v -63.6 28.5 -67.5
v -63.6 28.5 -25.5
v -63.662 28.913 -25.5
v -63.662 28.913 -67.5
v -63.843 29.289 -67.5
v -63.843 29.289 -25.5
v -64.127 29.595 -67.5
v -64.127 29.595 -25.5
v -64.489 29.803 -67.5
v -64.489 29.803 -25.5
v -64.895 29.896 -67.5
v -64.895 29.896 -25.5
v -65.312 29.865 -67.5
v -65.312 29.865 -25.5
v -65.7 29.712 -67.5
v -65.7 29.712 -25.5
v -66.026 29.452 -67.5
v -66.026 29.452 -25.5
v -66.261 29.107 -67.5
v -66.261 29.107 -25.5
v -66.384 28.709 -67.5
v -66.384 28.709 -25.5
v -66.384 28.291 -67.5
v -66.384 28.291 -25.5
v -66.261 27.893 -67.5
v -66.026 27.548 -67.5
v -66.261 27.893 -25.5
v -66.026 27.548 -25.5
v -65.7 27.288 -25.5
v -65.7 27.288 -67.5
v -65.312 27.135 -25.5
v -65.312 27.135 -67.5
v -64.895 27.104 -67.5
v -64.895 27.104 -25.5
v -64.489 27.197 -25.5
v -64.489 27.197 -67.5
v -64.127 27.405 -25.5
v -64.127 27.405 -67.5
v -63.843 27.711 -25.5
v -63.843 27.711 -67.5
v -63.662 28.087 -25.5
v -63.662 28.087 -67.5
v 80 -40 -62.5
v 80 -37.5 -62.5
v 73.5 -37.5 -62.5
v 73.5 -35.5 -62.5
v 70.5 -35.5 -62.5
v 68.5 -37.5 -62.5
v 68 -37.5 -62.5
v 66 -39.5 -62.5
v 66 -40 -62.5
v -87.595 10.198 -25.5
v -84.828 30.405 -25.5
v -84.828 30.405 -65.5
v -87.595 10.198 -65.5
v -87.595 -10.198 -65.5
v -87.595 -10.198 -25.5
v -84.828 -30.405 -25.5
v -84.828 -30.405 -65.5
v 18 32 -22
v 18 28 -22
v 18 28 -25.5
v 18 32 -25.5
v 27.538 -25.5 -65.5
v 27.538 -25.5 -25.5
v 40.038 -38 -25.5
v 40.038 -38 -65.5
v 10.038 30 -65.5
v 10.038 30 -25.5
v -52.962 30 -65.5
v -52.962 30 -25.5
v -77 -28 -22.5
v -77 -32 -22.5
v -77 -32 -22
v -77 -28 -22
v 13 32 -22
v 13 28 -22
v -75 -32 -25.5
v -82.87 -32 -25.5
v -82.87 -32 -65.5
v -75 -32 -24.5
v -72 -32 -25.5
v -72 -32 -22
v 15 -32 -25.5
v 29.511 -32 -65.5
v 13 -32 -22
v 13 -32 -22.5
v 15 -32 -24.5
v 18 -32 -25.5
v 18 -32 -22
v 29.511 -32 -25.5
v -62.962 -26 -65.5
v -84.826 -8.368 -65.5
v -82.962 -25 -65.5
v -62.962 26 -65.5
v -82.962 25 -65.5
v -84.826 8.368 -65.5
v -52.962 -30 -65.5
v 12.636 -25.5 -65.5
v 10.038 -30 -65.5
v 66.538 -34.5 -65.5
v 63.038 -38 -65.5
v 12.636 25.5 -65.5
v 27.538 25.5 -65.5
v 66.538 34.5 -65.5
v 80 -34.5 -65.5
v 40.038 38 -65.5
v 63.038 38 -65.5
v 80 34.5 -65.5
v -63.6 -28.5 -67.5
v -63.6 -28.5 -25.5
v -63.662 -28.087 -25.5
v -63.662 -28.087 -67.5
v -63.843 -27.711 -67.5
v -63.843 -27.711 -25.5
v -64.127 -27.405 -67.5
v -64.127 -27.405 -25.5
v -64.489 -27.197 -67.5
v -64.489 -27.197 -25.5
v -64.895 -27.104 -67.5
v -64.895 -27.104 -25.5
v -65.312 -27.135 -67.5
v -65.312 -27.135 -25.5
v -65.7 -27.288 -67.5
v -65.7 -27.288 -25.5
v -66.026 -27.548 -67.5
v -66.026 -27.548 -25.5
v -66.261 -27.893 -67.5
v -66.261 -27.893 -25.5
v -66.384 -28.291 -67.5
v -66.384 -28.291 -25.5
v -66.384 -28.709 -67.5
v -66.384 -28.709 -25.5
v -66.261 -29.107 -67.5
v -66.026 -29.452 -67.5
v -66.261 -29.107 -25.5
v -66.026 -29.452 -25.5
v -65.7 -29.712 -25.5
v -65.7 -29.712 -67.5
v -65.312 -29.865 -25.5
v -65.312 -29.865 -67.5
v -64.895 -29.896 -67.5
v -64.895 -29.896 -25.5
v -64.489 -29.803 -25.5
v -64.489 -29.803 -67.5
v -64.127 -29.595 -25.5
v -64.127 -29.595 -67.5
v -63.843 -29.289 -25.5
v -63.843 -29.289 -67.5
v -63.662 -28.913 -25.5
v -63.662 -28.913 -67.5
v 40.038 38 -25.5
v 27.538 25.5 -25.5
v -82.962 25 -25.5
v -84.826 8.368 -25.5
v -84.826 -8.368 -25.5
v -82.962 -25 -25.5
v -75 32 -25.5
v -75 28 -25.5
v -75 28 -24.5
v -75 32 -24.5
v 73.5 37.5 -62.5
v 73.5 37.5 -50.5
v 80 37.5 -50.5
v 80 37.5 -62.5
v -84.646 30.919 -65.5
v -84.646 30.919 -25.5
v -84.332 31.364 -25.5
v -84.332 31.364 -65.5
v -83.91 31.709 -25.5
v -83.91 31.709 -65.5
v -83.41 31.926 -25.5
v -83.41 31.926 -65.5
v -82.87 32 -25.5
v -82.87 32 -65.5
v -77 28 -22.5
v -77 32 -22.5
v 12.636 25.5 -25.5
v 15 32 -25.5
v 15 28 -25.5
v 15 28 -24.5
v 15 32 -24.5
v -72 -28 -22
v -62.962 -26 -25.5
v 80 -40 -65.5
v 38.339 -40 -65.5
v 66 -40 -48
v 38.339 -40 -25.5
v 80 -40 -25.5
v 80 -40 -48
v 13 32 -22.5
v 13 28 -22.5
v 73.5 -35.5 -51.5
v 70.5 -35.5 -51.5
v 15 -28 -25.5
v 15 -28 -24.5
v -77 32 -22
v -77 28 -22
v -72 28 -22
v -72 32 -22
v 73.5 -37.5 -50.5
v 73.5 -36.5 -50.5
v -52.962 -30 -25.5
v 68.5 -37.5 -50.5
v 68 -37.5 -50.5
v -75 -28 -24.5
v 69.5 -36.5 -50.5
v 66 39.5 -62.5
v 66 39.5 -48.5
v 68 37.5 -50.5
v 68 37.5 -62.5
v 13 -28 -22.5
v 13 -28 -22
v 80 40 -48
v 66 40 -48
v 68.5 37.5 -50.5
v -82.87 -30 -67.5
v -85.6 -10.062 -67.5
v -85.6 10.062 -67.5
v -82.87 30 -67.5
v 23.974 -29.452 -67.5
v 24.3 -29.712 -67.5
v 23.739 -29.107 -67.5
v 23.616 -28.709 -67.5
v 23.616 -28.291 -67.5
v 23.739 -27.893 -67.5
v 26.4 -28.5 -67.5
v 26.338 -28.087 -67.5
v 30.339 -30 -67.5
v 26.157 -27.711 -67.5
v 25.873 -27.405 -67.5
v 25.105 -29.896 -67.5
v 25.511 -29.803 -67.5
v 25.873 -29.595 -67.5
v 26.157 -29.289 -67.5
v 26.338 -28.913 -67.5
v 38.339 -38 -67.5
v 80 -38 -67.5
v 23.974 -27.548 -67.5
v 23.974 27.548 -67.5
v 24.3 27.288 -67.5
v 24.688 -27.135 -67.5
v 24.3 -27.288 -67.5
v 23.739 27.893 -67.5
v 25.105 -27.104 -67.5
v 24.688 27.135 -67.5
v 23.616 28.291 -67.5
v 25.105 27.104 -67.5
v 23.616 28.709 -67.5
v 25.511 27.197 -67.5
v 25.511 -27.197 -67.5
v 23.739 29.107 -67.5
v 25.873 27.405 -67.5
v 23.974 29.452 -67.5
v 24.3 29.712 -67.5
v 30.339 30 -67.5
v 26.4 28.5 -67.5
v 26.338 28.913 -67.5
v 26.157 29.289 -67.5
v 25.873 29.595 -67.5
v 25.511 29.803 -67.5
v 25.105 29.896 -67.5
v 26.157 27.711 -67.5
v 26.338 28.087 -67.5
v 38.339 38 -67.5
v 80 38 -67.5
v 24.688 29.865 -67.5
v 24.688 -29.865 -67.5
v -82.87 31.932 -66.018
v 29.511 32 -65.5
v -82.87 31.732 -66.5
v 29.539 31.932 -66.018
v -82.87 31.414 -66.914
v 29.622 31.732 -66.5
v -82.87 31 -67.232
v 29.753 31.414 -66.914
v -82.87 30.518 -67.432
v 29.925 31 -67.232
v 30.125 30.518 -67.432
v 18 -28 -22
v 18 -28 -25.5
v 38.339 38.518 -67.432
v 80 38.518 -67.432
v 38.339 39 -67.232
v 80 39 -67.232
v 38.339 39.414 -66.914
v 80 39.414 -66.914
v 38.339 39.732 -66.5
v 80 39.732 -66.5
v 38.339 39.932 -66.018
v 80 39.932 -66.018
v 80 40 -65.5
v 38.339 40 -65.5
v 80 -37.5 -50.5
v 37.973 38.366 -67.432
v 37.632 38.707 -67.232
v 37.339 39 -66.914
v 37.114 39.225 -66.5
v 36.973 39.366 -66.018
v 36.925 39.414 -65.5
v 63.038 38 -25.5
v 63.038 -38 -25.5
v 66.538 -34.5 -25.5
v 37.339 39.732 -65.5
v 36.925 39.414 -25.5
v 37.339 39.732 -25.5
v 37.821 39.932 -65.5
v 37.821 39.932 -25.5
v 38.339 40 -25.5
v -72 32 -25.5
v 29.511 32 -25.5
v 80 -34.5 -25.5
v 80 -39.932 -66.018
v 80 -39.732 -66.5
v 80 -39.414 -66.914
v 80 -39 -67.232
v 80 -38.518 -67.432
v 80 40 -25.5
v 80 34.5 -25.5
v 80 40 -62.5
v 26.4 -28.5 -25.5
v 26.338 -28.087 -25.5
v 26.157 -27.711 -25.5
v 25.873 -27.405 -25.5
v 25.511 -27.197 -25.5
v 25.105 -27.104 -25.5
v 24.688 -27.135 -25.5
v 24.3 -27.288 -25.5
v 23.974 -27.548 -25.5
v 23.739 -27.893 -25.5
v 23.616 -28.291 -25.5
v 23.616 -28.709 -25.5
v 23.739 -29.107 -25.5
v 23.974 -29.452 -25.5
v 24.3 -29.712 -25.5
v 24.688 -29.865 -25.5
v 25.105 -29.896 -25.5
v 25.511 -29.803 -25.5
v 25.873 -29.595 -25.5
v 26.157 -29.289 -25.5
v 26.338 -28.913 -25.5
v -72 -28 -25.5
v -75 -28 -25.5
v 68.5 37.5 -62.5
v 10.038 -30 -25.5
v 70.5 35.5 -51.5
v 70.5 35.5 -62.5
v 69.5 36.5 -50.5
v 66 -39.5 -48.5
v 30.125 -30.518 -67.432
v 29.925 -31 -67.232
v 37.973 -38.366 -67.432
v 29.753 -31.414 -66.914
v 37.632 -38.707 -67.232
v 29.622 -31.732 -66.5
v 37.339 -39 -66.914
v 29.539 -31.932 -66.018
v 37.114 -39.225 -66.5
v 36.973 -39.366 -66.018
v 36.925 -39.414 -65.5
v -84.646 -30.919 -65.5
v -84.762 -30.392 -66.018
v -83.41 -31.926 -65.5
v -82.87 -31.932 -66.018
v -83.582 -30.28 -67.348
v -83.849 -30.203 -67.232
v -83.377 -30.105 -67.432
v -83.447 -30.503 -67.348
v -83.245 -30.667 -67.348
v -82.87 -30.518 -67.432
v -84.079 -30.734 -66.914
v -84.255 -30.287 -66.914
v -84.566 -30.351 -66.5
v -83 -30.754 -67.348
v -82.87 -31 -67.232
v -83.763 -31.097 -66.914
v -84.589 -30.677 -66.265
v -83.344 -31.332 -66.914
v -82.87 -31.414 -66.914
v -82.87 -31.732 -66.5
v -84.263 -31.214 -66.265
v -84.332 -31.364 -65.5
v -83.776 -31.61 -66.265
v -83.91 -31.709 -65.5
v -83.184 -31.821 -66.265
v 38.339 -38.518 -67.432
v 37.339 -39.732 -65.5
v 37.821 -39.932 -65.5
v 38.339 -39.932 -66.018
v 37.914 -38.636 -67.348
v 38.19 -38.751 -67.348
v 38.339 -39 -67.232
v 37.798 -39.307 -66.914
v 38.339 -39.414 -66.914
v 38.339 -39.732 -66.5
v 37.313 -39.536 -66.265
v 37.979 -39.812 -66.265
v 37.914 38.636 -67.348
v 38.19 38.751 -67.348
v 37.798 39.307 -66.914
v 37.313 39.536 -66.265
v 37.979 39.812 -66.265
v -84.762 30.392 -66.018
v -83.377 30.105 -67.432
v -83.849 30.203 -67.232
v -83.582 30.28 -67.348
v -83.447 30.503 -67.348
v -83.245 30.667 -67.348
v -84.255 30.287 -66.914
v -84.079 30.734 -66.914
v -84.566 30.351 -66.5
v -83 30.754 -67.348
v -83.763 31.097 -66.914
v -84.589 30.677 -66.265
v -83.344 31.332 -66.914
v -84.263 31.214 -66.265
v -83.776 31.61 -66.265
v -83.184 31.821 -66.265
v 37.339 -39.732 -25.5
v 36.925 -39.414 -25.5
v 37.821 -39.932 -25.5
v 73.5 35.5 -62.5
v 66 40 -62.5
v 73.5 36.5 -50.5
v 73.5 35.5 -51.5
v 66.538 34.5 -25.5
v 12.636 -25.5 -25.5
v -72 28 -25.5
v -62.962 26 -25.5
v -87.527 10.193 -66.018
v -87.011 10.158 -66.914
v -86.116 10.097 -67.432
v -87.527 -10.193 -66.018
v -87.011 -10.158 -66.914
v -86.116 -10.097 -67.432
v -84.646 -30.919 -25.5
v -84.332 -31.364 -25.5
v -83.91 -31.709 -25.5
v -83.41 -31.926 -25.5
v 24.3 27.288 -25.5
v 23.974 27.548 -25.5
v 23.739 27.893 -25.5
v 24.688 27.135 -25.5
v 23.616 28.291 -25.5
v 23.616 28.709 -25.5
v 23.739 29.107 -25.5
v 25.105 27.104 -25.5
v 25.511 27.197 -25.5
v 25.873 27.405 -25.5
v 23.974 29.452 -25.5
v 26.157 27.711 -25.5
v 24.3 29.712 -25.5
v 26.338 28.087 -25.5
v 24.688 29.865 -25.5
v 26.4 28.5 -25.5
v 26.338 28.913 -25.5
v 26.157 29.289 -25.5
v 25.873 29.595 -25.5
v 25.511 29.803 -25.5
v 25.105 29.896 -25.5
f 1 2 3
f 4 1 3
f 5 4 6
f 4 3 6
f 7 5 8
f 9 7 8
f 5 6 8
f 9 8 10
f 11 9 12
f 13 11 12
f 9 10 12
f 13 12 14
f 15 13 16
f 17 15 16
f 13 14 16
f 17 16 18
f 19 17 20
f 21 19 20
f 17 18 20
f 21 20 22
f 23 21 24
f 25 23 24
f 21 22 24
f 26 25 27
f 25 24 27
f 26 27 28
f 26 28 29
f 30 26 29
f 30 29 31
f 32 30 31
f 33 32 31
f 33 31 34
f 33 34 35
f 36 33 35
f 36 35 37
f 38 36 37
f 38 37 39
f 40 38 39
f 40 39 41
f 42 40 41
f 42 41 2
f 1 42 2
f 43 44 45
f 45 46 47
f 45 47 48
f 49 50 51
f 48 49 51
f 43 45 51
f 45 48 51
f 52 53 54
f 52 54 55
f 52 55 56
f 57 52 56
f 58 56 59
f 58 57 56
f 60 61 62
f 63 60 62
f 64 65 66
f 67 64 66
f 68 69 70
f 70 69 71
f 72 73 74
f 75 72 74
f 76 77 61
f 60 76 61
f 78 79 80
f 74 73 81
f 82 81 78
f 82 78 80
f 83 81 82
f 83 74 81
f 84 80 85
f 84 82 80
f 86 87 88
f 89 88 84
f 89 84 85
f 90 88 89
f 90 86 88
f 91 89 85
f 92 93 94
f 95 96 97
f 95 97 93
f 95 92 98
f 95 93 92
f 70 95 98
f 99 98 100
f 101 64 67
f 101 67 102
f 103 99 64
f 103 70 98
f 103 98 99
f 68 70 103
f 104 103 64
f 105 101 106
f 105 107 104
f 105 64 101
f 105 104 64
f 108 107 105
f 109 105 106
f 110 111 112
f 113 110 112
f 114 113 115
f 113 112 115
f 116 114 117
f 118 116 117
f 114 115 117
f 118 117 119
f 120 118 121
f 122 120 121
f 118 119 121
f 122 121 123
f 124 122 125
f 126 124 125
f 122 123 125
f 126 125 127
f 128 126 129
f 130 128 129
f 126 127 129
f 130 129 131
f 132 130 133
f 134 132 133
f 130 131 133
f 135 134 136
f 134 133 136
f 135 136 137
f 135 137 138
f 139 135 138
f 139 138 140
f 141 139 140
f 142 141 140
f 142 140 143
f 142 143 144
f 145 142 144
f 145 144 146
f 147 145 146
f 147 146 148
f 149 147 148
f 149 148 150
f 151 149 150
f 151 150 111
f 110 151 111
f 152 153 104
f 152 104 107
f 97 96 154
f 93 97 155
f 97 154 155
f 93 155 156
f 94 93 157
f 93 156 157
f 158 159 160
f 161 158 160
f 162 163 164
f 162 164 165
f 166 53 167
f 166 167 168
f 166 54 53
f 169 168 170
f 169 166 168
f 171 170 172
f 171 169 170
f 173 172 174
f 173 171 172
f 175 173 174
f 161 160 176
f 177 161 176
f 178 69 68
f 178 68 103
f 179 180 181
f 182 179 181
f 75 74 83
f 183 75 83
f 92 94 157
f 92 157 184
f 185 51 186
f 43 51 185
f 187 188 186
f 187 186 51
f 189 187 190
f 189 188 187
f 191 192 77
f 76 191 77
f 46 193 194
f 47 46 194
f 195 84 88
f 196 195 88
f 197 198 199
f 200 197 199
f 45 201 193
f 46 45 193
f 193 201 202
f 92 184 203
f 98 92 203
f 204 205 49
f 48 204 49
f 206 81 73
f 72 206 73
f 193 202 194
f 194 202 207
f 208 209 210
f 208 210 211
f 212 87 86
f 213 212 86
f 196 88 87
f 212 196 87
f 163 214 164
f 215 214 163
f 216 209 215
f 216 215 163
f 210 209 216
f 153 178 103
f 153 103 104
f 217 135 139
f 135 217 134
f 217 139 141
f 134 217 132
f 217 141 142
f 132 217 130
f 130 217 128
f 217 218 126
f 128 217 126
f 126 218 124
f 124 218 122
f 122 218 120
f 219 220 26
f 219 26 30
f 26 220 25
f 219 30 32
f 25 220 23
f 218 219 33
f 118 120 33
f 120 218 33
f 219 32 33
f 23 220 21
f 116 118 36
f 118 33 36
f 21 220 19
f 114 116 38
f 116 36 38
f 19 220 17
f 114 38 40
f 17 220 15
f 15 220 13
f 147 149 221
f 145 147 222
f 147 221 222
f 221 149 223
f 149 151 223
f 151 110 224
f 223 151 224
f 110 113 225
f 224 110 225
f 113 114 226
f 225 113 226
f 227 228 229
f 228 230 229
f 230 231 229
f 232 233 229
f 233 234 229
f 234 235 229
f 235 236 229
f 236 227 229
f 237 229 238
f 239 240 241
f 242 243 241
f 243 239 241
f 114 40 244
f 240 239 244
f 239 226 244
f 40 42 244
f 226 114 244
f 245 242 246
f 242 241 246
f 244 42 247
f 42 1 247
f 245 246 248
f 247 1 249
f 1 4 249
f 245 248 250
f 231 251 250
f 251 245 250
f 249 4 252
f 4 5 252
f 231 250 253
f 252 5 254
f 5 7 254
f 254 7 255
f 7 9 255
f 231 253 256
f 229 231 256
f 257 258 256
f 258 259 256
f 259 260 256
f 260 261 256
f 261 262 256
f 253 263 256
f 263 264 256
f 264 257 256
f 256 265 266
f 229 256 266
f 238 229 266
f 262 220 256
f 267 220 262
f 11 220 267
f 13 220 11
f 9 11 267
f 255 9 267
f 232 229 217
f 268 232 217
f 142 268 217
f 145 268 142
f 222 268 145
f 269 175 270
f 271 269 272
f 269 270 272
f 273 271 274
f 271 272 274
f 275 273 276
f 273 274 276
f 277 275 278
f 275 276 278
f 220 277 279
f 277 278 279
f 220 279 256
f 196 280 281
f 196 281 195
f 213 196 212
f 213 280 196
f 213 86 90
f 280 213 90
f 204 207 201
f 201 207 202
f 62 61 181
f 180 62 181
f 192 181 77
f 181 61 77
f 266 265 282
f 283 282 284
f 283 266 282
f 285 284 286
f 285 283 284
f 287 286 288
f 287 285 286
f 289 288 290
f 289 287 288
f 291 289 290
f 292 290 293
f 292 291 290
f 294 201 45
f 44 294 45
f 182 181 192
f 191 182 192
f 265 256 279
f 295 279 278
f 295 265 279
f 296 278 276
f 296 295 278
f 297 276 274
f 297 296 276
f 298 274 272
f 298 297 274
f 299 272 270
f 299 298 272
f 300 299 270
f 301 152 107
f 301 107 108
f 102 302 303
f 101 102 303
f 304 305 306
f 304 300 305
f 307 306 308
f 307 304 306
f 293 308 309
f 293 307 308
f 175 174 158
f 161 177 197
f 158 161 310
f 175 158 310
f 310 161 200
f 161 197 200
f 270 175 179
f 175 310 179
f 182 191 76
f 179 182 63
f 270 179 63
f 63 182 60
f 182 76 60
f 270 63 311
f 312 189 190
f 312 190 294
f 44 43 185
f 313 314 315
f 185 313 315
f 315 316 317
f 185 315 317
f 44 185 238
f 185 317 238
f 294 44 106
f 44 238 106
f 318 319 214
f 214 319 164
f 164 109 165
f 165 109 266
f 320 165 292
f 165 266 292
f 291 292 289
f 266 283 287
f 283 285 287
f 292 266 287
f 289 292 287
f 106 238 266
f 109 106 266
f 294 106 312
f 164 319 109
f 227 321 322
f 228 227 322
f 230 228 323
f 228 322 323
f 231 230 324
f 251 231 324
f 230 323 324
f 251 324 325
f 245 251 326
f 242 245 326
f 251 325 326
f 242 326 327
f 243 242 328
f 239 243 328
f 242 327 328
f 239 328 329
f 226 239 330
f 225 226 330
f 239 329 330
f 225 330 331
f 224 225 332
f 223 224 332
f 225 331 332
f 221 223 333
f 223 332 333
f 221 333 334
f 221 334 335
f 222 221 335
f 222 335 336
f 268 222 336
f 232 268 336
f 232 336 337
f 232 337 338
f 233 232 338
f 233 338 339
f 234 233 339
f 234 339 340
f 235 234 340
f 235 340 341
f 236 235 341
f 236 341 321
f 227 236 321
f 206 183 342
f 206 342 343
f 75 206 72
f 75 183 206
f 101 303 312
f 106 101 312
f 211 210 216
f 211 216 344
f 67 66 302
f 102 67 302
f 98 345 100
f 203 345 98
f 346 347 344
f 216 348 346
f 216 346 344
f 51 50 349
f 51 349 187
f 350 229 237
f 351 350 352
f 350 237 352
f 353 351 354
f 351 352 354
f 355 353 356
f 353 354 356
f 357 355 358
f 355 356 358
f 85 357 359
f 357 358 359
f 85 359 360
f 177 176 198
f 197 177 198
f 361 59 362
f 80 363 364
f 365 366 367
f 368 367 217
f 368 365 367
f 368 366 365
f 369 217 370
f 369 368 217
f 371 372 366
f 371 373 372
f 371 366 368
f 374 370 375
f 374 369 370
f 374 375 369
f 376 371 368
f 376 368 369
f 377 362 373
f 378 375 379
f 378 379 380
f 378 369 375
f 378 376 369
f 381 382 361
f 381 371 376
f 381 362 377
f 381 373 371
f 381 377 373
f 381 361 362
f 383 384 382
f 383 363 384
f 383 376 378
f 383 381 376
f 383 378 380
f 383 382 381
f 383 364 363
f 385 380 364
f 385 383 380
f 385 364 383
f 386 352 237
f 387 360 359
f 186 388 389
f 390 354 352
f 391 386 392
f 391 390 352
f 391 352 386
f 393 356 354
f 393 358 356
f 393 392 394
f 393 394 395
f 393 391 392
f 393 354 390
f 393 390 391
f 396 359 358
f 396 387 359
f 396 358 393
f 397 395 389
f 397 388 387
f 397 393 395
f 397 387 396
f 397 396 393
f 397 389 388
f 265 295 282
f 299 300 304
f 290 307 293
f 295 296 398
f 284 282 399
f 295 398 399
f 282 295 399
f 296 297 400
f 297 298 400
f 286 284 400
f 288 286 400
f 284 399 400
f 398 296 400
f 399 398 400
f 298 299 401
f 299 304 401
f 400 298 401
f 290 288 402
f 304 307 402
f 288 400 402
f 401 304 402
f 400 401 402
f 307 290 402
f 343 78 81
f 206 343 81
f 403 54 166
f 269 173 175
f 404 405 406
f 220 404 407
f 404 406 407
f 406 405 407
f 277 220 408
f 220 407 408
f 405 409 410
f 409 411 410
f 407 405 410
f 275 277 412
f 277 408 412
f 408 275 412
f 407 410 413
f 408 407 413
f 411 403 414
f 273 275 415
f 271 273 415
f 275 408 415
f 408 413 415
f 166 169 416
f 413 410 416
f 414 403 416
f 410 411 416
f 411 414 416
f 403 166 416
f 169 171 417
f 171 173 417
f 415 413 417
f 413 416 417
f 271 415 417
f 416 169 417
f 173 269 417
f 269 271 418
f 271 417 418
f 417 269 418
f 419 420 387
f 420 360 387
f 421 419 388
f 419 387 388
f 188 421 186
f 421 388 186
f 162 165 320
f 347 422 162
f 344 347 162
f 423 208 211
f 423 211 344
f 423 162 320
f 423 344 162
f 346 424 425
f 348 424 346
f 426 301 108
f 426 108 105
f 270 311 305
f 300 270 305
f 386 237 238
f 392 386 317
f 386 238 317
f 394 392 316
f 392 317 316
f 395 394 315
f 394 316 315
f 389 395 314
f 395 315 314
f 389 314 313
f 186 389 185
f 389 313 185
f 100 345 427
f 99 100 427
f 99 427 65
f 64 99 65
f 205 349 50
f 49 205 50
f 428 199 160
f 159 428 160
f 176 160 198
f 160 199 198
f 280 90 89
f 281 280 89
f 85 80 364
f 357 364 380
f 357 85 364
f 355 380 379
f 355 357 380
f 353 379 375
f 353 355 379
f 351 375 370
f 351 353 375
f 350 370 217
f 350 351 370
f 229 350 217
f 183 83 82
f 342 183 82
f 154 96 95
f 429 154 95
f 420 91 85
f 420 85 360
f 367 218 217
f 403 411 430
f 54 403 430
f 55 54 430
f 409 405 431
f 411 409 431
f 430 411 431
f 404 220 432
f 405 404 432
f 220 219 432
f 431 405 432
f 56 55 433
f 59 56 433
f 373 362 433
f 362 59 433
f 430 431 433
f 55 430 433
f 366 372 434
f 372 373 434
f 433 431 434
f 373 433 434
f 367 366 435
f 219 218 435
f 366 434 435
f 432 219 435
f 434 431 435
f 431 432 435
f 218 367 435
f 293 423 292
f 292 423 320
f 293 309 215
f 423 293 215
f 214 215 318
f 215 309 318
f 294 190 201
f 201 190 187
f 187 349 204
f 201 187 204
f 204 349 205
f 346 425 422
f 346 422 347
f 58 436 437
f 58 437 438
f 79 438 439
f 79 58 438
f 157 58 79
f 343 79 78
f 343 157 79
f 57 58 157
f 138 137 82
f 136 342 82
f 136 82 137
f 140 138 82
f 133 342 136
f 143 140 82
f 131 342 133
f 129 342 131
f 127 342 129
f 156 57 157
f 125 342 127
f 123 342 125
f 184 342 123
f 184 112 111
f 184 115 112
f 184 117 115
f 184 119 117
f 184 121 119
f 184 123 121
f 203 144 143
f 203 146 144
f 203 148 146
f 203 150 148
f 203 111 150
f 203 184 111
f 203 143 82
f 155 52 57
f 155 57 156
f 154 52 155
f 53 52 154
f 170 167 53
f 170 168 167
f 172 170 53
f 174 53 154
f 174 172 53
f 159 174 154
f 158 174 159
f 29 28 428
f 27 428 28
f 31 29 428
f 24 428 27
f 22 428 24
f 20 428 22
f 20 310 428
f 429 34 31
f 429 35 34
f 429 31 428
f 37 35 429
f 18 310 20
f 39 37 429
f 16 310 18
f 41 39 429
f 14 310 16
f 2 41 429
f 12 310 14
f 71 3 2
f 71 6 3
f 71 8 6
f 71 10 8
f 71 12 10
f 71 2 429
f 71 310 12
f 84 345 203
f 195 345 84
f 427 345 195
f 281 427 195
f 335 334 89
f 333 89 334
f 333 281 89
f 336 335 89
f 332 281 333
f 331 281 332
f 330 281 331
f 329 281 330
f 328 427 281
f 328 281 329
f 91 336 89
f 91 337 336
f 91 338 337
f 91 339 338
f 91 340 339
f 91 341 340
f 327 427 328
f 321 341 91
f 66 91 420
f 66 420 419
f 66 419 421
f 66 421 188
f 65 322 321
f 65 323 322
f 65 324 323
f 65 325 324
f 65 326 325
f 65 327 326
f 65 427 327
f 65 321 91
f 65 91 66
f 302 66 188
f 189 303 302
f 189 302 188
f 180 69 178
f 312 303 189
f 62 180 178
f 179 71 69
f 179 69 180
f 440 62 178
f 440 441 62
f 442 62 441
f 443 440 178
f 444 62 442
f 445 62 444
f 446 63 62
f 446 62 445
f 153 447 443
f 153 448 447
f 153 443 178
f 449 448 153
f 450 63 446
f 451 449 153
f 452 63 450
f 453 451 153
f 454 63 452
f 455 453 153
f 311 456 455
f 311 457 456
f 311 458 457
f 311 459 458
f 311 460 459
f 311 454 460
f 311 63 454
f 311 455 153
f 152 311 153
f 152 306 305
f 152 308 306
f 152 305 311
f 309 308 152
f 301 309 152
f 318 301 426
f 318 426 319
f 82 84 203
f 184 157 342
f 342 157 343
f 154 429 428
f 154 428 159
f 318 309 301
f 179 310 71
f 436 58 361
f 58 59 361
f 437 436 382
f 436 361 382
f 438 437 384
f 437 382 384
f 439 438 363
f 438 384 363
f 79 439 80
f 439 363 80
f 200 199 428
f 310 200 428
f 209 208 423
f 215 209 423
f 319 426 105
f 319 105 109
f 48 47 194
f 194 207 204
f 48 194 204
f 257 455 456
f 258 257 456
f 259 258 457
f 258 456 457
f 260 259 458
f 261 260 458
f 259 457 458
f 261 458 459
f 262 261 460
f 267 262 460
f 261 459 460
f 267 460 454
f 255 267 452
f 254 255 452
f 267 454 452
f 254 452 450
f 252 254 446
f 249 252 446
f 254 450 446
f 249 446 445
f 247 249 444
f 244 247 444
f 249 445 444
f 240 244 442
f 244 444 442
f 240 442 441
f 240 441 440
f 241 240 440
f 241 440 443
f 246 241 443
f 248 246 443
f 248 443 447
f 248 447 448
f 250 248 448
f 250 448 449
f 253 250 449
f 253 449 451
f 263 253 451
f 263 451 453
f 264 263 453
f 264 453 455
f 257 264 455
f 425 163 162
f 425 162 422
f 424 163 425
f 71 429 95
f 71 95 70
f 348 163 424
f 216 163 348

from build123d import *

# Parameters (mm, degrees)
EXTRUDE136072_DEPTH                     = 12
CHAMFER002_SIZE                         = 1
EXTRUDE136071_DEPTH                     = 15
CHAMFER001_SIZE                         = 2
SKETCH295_R                             = 1.4
EXTRUDE136074_DEPTH                     = 50
EXTRUDE136076_DEPTH                     = 4
EXTRUDE136076_ONTO_SKETCH296_ROLL_ANGLE = 90
EXTRUDE136075_DEPTH                     = 4
EXTRUDE136075_ONTO_SKETCH296_ROLL_ANGLE = 90
BOX022_W                                = 25
BOX022_H                                = 80
BOX022_DEPTH                            = 51
EXTRUDE136056_DEPTH                     = 40
EXTRUDE136055_DEPTH                     = 42
FILLET_R                                = 2


with BuildPart() as chamfer002:
    # Sketch293 → Extrude136072 (new body)
    with BuildSketch(Plane.XY):
        Polygon((0, 37.5), (5, 37.5), (5, 35.5), (2, 35.5), align=None)
        Polygon((0, -37.5), (5, -37.5), (5, -35.5), (2, -35.5), align=None)
    extrude(amount=-EXTRUDE136072_DEPTH)


with BuildPart() as chamfer002_1:
    # Extrude136072 placement: moved
    add(chamfer002.part.moved(Location((4, 0, 6))))

    # Chamfer002
    chamfer002_edges = [chamfer002_1.edges().sort_by_distance(p)[0] for p in [
        (7.5, -35.5, 6),
        (7.5, 35.5, 6),
    ]]
    chamfer(chamfer002_edges, length=CHAMFER002_SIZE)


with BuildPart() as fusion034004041070:
    # Sketch292 → Extrude136071 (new body)
    with BuildSketch(Plane.YZ):
        Polygon((-40, 8.5), (-37.5, 6), (-37.5, -6), (-40, -6), align=None)
        Polygon((40, 8.5), (37.5, 6), (37.5, -6), (40, -6), align=None)
    extrude(amount=EXTRUDE136071_DEPTH)

    # Chamfer001
    chamfer001_edges = [fusion034004041070.edges().sort_by_distance(p)[0] for p in [
        (0, 37.5, 0),
        (0, -37.5, 0),
    ]]
    chamfer(chamfer001_edges, length=CHAMFER001_SIZE)


with BuildPart() as fusion034004041070_1:
    # Chamfer001 placement: moved
    add(fusion034004041070.part.moved(Location((1.5, 0, 0))))

    # Fusion034004041070: union Chamfer002
    add(chamfer002_1.part)


with BuildPart() as fusion034004041070_2:
    # Fusion034004041070 placement: moved
    add(fusion034004041070_1.part.moved(Location((64.5, 0, -31))))


with BuildPart() as fusion034004041071:
    # Sketch295 → Extrude136074 (new body)
    with BuildSketch(Plane.XY):
        with Locations((-65, 28.5)):
            Circle(SKETCH295_R)
        with Locations((25, 28.5)):
            Circle(SKETCH295_R)
        with Locations((-65, -28.5)):
            Circle(SKETCH295_R)
        with Locations((25, -28.5)):
            Circle(SKETCH295_R)
    extrude(amount=-EXTRUDE136074_DEPTH)

    # Fusion034004041071: union Fusion034004041070
    add(fusion034004041070_2.part)


with BuildPart() as extrude136076:
    # Sketch296 as drawn → Extrude136076 (new)
    with BuildSketch(Plane.XY):
        Polygon((-77, 3.5), (-72, 3.5), (-72, 0), (-75, 0), (-75, 1), (-77, 3), align=None)
        Polygon((15, 0), (15, 1), (13, 3), (13, 3.5), (18, 3.5), (18, 0), align=None)
    extrude(amount=-EXTRUDE136076_DEPTH)


with BuildPart() as extrude136076_1:
    # Extrude136076 onto Sketch296 roll: moved
    add(extrude136076.part.rotate(Axis((0, 0, 0), (1, 0, 0)), EXTRUDE136076_ONTO_SKETCH296_ROLL_ANGLE))


with BuildPart() as extrude136076_2:
    # Extrude136076 onto Sketch296 placement: moved
    add(extrude136076_1.part.moved(Location((0, -2, 0))))


with BuildPart() as extrude136076_3:
    # Extrude136076 placement: moved
    add(extrude136076_2.part.moved(Location((0, -30, 0))))


with BuildPart() as fusion034004041067:
    # Sketch296 as drawn → Extrude136075 (new)
    with BuildSketch(Plane.XY):
        Polygon((-77, 3.5), (-72, 3.5), (-72, 0), (-75, 0), (-75, 1), (-77, 3), align=None)
        Polygon((15, 0), (15, 1), (13, 3), (13, 3.5), (18, 3.5), (18, 0), align=None)
    extrude(amount=-EXTRUDE136075_DEPTH)


with BuildPart() as fusion034004041067_1:
    # Extrude136075 onto Sketch296 roll: moved
    add(fusion034004041067.part.rotate(Axis((0, 0, 0), (1, 0, 0)), EXTRUDE136075_ONTO_SKETCH296_ROLL_ANGLE))


with BuildPart() as fusion034004041067_2:
    # Extrude136075 onto Sketch296 placement: moved
    add(fusion034004041067_1.part.moved(Location((0, -2, 0))))


with BuildPart() as fusion034004041067_3:
    # Extrude136075 placement: moved
    add(fusion034004041067_2.part.moved(Location((0, 30, 0))))

    # Fusion034004041067: union Extrude136076
    add(extrude136076_3.part)


with BuildPart() as cube019:
    # Box022 → Box022 (new body)
    with BuildSketch(Plane(origin=(80, -40, -44), x_dir=(1, 0, 0), z_dir=(0, 0, 1))):
        with Locations((12.5, 40)):
            Rectangle(BOX022_W, BOX022_H)
    extrude(amount=BOX022_DEPTH)


with BuildPart() as extrude136056:
    # Sketch277 → Extrude136056 (new body)
    with BuildSketch(Plane.XY):
        with BuildLine():
            ThreePointArc((81.0383, -34.5), (85.059706, 0), (81.0383, 34.5))
            Line((66.5383, 34.5), (81.0383, 34.5))
            Line((63.0383, 38), (66.5383, 34.5))
            Line((40.0383, 38), (63.0383, 38))
            Line((27.5383, 25.5), (40.0383, 38))
            Line((12.636376, 25.5), (27.5383, 25.5))
            Line((10.0383, 30), (12.636376, 25.5))
            Line((10.0383, 30), (-52.9617, 30))
            Line((-62.9617, 26), (-52.9617, 30))
            Line((-82.9617, 25), (-62.9617, 26))
            ThreePointArc((-82.9617, 25), (-85.059706, 0), (-82.9617, -25))
            Line((-82.9617, -25), (-62.9617, -26))
            Line((-62.9617, -26), (-52.9617, -30))
            Line((10.0383, -30), (-52.9617, -30))
            Line((10.0383, -30), (12.636376, -25.5))
            Line((12.636376, -25.5), (27.5383, -25.5))
            Line((27.5383, -25.5), (40.0383, -38))
            Line((40.0383, -38), (63.0383, -38))
            Line((63.0383, -38), (66.5383, -34.5))
            Line((66.5383, -34.5), (81.0383, -34.5))
        make_face()
    extrude(amount=-EXTRUDE136056_DEPTH)


with BuildPart() as batteryboxfillet:
    # Sketch276 → Extrude136055 (new body)
    with BuildSketch(Plane.XY):
        with BuildLine():
            ThreePointArc((-84.489299, 32), (-87.942378, 0), (-84.489299, -32))
            Line((-84.489299, -32), (29.510701, -32))
            Line((29.510701, -32), (37.510701, -40))
            Line((37.510701, -40), (82.510701, -40))
            ThreePointArc((82.510701, -40), (87.942378, 0), (82.510701, 40))
            Line((37.510701, 40), (82.510701, 40))
            Line((29.510701, 32), (37.510701, 40))
            Line((-84.489299, 32), (29.510701, 32))
        make_face()
    extrude(amount=-EXTRUDE136055_DEPTH)

    # Cut009010006006006005016: cut Extrude136056
    add(extrude136056.part, mode=Mode.SUBTRACT)

    # Cut009010006006006005021: cut Cube019
    add(cube019.part, mode=Mode.SUBTRACT)

    # Fusion034004041068: union Fusion034004041067
    add(fusion034004041067_3.part)

    # Cut009010006006006005024: cut Fusion034004041071
    add(fusion034004041071.part, mode=Mode.SUBTRACT)

    # Fillet
    fillet_edges = [batteryboxfillet.edges().sort_by_distance(p)[0] for p in [
        (-84.489299, 32, -21),
        (-84.489299, -32, -21),
        (-87.942378, 0, -42),
        (-27.489299, 32, -42),
        (-27.489299, -32, -42),
        (33.510701, 36, -42),
        (58.755351, 40, -42),
        (33.510701, -36, -42),
        (58.755351, -40, -42),
        (37.510701, 40, -21),
        (37.510701, -40, -21),
    ]]
    fillet(fillet_edges, radius=FILLET_R)


with BuildPart() as batteryboxfillet_1:
    # Fillet placement: moved
    add(batteryboxfillet.part.moved(Location((0, 0, -25.5))))


solid = batteryboxfillet_1.part
